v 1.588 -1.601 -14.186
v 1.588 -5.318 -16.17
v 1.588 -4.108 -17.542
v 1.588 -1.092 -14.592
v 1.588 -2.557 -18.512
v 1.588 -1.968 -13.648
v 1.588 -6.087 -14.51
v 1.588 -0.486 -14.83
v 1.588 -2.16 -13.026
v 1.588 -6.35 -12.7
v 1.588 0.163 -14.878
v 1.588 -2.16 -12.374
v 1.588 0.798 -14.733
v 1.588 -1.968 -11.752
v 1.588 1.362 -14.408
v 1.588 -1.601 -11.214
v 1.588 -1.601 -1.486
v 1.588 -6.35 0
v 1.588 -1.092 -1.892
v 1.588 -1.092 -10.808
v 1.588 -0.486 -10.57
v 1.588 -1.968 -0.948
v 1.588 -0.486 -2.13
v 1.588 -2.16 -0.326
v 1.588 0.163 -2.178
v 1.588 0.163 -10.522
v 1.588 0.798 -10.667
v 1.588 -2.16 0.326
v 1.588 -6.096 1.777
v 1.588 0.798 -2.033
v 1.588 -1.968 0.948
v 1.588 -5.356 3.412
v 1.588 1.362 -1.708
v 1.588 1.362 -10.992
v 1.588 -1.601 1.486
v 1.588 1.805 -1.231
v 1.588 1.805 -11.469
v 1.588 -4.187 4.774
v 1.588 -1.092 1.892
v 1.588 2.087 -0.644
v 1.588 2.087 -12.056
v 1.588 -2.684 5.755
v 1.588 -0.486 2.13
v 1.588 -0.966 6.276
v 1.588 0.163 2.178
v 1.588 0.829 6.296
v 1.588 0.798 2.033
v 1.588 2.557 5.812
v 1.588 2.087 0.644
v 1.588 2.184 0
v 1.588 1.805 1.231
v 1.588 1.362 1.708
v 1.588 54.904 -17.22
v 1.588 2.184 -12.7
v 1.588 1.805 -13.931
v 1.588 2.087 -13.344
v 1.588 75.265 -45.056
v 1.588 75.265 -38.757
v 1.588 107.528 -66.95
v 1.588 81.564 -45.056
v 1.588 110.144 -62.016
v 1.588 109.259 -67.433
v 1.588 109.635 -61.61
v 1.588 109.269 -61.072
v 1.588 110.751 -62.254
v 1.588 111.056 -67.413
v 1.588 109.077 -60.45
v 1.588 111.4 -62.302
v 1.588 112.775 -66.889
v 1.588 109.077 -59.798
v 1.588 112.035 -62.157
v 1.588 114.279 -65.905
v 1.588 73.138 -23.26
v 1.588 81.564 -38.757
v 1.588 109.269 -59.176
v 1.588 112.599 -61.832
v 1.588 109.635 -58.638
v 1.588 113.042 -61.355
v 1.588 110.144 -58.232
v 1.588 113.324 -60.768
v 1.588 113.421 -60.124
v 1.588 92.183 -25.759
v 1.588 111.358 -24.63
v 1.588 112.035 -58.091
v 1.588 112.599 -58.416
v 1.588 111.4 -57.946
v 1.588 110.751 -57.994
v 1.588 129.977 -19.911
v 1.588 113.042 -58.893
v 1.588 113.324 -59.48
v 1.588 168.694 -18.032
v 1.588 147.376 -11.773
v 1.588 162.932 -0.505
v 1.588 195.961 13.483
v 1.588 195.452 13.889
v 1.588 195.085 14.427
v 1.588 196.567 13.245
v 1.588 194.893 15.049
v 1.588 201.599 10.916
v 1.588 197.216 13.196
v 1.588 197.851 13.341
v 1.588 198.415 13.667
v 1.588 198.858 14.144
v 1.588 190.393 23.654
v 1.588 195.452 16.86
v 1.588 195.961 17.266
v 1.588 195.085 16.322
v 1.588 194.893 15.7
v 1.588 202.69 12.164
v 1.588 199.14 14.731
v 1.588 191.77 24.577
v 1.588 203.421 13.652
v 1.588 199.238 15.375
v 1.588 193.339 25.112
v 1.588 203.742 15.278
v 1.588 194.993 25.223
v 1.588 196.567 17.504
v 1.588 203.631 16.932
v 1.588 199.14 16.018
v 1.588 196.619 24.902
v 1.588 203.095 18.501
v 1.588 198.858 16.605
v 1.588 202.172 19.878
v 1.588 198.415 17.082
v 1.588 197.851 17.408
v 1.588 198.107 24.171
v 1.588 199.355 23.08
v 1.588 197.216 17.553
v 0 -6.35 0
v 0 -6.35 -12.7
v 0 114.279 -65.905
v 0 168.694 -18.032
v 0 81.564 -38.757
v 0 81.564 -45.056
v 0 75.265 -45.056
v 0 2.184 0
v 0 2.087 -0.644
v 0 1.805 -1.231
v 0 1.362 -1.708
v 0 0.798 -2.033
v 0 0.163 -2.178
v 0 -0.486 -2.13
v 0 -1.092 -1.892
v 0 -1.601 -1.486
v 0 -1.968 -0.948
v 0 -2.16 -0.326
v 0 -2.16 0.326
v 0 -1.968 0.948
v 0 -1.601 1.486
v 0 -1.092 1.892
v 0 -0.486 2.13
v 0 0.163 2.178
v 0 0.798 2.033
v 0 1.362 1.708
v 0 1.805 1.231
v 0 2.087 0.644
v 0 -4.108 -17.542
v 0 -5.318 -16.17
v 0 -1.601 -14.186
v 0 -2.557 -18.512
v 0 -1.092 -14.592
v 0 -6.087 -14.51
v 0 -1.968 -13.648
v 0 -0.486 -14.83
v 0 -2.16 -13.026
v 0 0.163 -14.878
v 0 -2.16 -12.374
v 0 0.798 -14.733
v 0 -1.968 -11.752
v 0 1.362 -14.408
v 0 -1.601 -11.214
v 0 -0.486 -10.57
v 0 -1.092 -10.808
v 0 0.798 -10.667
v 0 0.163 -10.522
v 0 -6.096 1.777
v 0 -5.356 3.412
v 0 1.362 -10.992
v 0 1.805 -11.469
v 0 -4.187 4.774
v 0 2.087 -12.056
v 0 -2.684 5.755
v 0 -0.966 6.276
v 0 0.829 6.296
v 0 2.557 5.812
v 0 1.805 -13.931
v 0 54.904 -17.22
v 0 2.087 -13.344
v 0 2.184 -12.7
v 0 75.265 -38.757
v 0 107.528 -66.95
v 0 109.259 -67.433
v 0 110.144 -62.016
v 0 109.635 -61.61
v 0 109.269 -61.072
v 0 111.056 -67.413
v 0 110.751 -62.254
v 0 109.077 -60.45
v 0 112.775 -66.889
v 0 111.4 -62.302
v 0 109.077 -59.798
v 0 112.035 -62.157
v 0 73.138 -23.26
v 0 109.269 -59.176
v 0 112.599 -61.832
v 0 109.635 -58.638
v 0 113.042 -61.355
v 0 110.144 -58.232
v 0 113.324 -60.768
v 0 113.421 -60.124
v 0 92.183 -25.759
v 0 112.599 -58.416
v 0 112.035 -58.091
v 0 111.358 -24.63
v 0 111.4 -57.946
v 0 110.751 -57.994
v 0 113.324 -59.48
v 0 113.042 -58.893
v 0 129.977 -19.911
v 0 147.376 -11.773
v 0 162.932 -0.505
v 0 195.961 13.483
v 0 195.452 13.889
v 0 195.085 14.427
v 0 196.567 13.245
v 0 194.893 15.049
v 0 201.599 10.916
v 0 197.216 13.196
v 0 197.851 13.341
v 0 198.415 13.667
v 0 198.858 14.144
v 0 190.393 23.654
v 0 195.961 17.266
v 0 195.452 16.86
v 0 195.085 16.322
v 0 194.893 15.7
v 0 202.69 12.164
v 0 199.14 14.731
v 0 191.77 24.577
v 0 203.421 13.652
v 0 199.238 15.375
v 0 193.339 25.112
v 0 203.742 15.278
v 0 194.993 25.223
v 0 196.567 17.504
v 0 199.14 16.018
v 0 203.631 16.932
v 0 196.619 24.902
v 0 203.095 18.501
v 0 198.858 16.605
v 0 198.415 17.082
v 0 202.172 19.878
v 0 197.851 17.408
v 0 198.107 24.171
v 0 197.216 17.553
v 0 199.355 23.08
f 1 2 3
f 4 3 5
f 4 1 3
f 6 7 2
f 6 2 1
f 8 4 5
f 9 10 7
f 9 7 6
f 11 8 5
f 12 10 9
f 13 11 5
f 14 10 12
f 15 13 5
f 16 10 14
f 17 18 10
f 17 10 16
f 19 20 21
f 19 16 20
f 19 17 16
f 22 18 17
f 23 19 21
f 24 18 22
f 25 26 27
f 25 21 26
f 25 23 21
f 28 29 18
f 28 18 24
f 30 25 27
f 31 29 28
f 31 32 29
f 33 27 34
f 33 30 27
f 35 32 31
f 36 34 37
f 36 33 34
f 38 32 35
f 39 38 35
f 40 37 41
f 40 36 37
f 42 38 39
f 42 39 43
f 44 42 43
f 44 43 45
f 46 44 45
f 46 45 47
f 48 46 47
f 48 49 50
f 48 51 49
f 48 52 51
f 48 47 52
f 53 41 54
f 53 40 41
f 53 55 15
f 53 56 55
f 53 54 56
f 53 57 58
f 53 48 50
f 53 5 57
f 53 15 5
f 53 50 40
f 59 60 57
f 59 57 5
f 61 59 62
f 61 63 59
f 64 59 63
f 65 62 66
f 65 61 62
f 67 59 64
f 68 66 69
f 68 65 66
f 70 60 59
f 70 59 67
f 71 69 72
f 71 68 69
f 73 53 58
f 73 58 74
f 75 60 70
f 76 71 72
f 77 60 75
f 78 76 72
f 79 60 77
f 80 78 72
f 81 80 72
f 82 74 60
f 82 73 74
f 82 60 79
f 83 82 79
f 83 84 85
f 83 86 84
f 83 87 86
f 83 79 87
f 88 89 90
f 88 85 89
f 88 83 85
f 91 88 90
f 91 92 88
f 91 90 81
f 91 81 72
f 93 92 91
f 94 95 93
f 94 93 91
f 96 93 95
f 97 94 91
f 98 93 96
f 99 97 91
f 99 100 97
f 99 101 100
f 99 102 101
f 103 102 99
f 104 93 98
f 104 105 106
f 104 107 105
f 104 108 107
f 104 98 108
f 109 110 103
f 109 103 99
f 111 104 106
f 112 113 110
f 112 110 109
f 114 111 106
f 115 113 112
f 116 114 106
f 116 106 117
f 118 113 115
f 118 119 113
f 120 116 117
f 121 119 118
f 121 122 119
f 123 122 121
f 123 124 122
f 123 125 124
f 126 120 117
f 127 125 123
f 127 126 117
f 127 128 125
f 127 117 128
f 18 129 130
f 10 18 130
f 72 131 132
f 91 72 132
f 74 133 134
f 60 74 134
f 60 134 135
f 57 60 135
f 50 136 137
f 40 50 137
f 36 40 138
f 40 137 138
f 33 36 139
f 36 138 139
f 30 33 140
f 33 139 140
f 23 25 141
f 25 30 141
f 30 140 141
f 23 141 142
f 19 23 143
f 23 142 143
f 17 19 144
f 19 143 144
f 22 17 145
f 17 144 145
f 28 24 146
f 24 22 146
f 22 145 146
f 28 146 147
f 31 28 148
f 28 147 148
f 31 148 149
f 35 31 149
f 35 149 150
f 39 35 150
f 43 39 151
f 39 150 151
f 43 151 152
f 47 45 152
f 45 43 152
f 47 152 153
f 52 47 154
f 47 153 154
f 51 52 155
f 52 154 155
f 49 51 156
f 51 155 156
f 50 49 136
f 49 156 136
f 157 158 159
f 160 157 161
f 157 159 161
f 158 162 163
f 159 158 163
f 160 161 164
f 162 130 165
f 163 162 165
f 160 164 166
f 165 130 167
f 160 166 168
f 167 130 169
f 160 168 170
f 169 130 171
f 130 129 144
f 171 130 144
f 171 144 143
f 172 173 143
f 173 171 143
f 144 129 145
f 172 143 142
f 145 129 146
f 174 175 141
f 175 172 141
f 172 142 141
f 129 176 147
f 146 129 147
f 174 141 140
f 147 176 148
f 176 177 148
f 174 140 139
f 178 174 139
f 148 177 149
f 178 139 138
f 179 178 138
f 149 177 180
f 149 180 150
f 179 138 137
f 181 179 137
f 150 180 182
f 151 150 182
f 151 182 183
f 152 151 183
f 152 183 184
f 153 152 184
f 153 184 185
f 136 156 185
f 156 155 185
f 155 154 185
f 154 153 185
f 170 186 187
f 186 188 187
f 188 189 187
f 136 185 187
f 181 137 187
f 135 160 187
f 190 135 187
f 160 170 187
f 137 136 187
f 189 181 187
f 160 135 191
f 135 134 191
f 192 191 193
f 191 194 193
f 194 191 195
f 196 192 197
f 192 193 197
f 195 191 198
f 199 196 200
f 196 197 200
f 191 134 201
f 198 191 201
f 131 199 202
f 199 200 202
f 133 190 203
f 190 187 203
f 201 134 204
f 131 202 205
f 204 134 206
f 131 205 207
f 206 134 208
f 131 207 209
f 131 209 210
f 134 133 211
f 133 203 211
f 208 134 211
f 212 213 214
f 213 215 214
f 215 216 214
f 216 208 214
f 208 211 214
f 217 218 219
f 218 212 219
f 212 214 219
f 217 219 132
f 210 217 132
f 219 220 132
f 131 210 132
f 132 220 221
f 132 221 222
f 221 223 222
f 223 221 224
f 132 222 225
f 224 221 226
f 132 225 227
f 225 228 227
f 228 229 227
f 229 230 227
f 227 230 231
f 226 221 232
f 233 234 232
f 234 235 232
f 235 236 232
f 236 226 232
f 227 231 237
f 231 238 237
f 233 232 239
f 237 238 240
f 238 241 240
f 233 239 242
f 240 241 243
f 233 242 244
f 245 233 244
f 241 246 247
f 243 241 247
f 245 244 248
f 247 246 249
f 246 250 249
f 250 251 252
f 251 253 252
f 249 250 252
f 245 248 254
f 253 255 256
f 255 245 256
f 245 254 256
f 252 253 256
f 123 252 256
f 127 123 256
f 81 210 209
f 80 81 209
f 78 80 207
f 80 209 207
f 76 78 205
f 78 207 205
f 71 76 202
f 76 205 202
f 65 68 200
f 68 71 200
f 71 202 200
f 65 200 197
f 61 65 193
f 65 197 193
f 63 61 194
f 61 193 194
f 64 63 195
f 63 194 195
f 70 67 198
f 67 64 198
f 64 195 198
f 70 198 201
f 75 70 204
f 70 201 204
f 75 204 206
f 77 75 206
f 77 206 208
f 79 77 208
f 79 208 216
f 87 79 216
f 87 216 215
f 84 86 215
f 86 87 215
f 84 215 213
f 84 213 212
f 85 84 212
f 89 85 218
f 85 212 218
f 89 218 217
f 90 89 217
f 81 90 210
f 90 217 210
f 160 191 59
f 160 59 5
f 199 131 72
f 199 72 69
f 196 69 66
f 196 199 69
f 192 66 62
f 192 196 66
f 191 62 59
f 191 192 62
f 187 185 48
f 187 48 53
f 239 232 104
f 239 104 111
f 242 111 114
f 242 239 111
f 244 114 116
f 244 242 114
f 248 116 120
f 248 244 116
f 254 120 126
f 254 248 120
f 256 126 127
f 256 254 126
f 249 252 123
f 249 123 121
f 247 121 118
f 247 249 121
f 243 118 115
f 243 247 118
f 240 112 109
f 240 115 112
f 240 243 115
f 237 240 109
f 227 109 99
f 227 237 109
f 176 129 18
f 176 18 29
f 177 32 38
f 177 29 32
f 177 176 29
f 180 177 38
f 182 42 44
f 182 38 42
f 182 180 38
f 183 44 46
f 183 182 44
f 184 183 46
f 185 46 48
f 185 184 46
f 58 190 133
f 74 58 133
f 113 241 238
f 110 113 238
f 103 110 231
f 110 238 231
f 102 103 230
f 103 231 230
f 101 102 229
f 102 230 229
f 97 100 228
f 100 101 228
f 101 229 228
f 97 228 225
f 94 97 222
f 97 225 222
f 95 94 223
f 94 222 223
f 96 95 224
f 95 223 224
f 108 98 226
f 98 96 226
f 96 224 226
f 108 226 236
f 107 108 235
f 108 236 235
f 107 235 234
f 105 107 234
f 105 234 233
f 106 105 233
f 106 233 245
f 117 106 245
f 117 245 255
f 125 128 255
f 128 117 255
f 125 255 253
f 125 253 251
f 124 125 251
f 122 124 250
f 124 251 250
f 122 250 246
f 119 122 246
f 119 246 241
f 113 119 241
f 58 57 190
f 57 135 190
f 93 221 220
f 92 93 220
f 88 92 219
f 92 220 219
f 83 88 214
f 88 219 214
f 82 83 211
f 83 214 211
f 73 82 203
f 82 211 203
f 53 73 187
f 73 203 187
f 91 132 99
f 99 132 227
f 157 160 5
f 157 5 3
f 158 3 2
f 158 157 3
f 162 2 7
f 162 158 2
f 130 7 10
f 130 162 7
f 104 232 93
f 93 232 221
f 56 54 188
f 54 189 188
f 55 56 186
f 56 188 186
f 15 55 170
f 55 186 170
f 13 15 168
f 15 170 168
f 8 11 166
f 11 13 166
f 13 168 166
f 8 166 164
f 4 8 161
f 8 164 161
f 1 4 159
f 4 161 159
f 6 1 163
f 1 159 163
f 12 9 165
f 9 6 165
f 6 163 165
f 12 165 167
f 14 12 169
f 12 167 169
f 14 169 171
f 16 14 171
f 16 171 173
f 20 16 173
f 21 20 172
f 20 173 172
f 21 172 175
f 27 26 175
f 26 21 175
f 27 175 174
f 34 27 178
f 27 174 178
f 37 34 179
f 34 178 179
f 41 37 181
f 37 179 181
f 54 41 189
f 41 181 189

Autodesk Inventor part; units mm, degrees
ref_plane "YZ Plane" through (0, 0, 0) normal (1, 0, 0) x (0, 1, 0)
ref_plane "XZ Plane" through (0, 0, 0) normal (0, 1, 0) x (-1, 0, 0)
ref_plane "XY Plane" through (0, 0, 0) normal (0, 0, 1) x (1, 0, 0)
sketch "main" plane through (0, 0, 0) normal (0, 0, 1) x (1, 0, 0)
  circle A0 centre (-11.2144, -104.2473) radius 2.1844
  circle A1 centre (1.4856, -104.2473) radius 2.1844
  circle A2 centre (48.9096, 6.9894) radius 2.1844
  circle A3 centre (-26.5889, 92.8058) radius 2.1844
  arc A4 (1.4856, -110.5973) -> (7.2979, -106.8047) centre (1.4856, -104.2473) ccw
  arc A5 (-17.0266, -101.6899) -> (-11.2144, -110.5973) centre (-11.2144, -104.2473) ccw
  line L0 (54.6905, 10.0319) -> (-22.1306, 97.3516)
  line L1 (55.7352, 3.2802) -> (7.2979, -106.8047)
  line L2 (-31.0925, 97.9248) -> (-34.2947, 95.1076)
  line L3 (-33.7837, 110.5973) -> (6.8178, 64.4472)
  line L4 (-17.0266, -101.6899) -> (6.006, -49.3432)
  line L5 (-34.8679, 86.1457) -> (-10.7088, 58.6849)
  arc A6 (-34.2947, 95.1076) -> (-34.8679, 86.1457) centre (-30.1004, 90.34) ccw
  arc A7 (-22.1306, 97.3516) -> (-31.0925, 97.9248) centre (-26.8981, 93.1573) ccw
  arc A8 (55.7352, 3.2802) -> (54.6905, 10.0319) centre (49.923, 5.8376) ccw
  arc A9 (6.006, -49.3432) -> (-10.7088, 58.6849) centre (-86.9901, -8.425) ccw
  line L6 (-11.2144, -110.5973) -> (1.4856, -110.5973)
  point P0 (16.4228, 13.0791)
  point P1 (-26.3249, 102.1192)
  point P2 (49.8339, -10.1318)
  dimension "d9" = 6.35
  dimension "d10" = 6.35
  dimension "d11" = 101.6
sketch "Sketch1" plane through (0, 0, 0) normal (1, 0, 0) x (0, 1, 0)
  line L0 (75.2647, -38.7566) -> (81.5639, -38.7566)
  line L1 (81.5639, -38.7566) -> (81.5639, -45.0558)
  line L2 (81.5639, -45.0558) -> (75.2647, -45.0558)
  line L3 (75.2647, -45.0558) -> (75.2647, -38.7566)
  line L4 (75.2647, -38.7566) -> (81.5639, -45.0558) construction
  line L5 (81.5639, -38.7566) -> (75.2647, -45.0558) construction
  circle A0 centre (0, 0) radius 2.1844
  circle A1 centre (0, -12.7) radius 2.1844
  circle A2 centre (111.2367, -60.124) radius 2.1844
  circle A3 centre (197.0531, 15.3746) radius 2.1844
  arc A4 (-6.35, -12.7) -> (-2.5574, -18.5123) centre (0, -12.7) ccw
  arc A5 (2.5574, 5.8123) -> (-6.35, 0) centre (0, 0) ccw
  line L6 (114.2793, -65.9049) -> (201.599, 10.9162)
  line L7 (107.5275, -66.9496) -> (-2.5574, -18.5123)
  line L8 (202.1722, 19.8781) -> (199.3549, 23.0804)
  line L9 (214.8446, 22.5693) -> (168.6945, -18.0321)
  line L10 (2.5574, 5.8123) -> (54.9042, -17.2203)
  line L11 (190.393, 23.6536) -> (162.9322, -0.5055)
  arc A6 (199.3549, 23.0804) -> (190.393, 23.6536) centre (194.5874, 18.886) ccw
  arc A7 (201.599, 10.9162) -> (202.1722, 19.8781) centre (197.4046, 15.6838) ccw
  arc A8 (107.5275, -66.9496) -> (114.2793, -65.9049) centre (110.0849, -61.1373) ccw
  arc A9 (54.9042, -17.2203) -> (162.9322, -0.5055) centre (95.8224, 75.7757) ccw
  line L12 (-6.35, 0) -> (-6.35, -12.7)
  point P0 (0, 0)
  dimension "d12" = 6.2992
  dimension "d13" = 6.2992
extrude "Extrusion1" add sketch "Sketch1" along normal blind 1.5875
properties part number "Support Gusset" material "Acetal Resin, White"
